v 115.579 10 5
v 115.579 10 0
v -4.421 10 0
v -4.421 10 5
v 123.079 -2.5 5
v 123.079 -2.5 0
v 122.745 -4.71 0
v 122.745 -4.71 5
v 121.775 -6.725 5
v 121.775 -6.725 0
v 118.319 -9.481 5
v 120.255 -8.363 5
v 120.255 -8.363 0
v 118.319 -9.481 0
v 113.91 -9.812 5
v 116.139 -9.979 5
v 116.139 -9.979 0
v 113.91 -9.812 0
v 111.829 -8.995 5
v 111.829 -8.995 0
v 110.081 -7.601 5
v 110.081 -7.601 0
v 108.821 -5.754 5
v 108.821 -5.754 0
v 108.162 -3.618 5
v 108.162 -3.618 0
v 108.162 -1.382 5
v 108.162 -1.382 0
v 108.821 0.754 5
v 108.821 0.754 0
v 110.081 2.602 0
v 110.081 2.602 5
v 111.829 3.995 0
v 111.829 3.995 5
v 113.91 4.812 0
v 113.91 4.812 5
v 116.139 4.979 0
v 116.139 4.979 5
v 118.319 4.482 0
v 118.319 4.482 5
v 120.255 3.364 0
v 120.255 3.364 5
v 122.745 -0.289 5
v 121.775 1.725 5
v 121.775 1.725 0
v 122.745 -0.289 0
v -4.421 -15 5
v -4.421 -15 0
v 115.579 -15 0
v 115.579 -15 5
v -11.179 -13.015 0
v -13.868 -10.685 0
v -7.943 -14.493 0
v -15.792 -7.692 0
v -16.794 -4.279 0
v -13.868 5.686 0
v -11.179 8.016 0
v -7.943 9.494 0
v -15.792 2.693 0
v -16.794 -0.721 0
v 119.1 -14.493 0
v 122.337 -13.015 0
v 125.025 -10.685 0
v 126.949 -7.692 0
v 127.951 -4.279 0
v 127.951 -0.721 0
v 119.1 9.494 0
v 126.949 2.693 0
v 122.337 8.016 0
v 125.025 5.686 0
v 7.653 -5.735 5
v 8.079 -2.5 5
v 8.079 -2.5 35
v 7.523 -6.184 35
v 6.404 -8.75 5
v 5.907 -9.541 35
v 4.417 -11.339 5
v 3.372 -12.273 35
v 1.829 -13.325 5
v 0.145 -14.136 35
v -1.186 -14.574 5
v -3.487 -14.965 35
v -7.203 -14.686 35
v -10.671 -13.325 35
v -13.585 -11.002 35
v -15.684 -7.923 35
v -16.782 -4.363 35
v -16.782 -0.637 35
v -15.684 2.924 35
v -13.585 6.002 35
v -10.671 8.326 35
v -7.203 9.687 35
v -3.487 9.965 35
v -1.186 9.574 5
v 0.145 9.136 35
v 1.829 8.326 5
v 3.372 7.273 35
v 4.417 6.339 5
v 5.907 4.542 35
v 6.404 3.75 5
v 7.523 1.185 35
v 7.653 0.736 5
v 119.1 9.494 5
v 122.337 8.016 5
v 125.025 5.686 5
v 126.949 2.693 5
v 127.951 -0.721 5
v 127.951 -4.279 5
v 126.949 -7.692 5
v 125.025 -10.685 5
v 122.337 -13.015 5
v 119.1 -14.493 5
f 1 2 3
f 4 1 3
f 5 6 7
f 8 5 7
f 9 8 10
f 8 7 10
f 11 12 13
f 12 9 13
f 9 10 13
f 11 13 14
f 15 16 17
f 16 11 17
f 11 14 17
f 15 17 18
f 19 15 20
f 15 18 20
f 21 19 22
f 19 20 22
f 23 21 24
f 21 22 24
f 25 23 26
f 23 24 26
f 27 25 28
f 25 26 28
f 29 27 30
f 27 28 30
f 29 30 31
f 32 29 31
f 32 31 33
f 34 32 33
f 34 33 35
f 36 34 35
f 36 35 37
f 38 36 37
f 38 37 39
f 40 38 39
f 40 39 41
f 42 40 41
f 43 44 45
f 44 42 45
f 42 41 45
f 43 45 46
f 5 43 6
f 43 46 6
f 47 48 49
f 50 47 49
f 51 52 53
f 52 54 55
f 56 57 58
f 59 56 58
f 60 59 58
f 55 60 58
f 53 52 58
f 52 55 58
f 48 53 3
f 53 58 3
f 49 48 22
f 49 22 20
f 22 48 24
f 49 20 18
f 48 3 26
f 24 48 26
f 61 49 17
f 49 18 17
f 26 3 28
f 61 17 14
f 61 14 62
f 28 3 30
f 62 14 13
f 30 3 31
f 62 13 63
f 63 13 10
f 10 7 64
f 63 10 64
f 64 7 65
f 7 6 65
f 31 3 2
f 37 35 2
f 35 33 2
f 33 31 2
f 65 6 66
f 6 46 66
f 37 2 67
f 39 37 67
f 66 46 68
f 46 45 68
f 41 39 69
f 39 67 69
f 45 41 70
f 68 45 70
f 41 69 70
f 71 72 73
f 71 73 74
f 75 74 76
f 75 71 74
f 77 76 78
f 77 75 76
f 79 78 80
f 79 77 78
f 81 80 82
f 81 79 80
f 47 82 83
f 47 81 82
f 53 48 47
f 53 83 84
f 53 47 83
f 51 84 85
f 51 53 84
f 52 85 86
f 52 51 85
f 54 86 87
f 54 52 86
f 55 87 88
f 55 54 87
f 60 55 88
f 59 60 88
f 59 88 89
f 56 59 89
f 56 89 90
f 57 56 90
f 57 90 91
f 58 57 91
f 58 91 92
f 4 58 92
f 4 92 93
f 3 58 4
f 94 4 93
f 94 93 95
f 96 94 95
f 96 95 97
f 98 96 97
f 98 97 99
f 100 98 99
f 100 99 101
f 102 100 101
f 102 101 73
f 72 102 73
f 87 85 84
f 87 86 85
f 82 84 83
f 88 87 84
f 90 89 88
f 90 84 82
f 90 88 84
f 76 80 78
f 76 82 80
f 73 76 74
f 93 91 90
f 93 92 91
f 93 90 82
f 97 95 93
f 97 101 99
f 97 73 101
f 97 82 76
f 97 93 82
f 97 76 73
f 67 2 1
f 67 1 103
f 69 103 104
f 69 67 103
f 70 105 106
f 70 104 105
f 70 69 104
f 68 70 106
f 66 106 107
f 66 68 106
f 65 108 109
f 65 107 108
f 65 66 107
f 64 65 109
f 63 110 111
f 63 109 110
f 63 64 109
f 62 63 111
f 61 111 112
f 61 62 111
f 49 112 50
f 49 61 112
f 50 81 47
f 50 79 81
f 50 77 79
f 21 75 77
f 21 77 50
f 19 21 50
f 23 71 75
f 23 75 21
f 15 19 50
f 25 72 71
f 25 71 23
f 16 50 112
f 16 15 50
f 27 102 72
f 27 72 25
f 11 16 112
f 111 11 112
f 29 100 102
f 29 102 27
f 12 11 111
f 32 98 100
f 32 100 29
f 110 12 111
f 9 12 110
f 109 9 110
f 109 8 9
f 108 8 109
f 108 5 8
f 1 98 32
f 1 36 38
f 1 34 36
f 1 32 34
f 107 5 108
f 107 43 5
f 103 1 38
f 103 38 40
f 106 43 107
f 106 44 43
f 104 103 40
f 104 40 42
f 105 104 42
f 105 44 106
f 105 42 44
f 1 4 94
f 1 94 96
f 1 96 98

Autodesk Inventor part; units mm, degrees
ref_plane "YZ Plane" through (0, 0, 0) normal (1, 0, 0) x (0, 1, 0)
ref_plane "XZ Plane" through (0, 0, 0) normal (0, 1, 0) x (-1, 0, 0)
ref_plane "XY Plane" through (0, 0, 0) normal (0, 0, 1) x (1, 0, 0)
sketch "Boceto1" plane through (0, 0, 0) normal (0, 0, 1) x (1, 0, 0)
  line L0 (-4.4214, -2.4997) -> (115.5786, -2.4997) construction
  line L1 (-4.4214, -14.9997) -> (115.5786, -14.9997)
  line L2 (115.5786, 10.0003) -> (-4.4214, 10.0003)
  arc A0 (-4.4214, 10.0003) -> (-4.4214, -14.9997) centre (-4.4214, -2.4997) ccw
  arc A1 (115.5786, -14.9997) -> (115.5786, 10.0003) centre (115.5786, -2.4997) ccw
  circle A2 centre (115.5786, -2.4997) radius 7.5
  point P0 (0, 0)
  point P1 (55.5786, -2.4997)
  dimension "d3" = 120
  dimension "d4" = 25
  dimension "d5" = 15
extrude "Extrusión1" add sketch "Boceto1" along normal blind 5
sketch "Boceto4" plane through (0, 0, 5) normal (0, 0, 1) x (1, 0, 0)
  arc A0 (-4.4214, 10.0003) -> (-4.4214, -14.9997) centre (-4.4214, -2.4997) ccw projected
  circle A1 centre (-4.4214, -2.4997) radius 12.5
  point P0 (0, 0)
  point P1 (-4.4214, -14.9997)
  dimension "d12" = 25
extrude "Extrusión3" add sketch "Boceto4" along normal blind 30
properties part number "L1" material "Aluminio 6061"
